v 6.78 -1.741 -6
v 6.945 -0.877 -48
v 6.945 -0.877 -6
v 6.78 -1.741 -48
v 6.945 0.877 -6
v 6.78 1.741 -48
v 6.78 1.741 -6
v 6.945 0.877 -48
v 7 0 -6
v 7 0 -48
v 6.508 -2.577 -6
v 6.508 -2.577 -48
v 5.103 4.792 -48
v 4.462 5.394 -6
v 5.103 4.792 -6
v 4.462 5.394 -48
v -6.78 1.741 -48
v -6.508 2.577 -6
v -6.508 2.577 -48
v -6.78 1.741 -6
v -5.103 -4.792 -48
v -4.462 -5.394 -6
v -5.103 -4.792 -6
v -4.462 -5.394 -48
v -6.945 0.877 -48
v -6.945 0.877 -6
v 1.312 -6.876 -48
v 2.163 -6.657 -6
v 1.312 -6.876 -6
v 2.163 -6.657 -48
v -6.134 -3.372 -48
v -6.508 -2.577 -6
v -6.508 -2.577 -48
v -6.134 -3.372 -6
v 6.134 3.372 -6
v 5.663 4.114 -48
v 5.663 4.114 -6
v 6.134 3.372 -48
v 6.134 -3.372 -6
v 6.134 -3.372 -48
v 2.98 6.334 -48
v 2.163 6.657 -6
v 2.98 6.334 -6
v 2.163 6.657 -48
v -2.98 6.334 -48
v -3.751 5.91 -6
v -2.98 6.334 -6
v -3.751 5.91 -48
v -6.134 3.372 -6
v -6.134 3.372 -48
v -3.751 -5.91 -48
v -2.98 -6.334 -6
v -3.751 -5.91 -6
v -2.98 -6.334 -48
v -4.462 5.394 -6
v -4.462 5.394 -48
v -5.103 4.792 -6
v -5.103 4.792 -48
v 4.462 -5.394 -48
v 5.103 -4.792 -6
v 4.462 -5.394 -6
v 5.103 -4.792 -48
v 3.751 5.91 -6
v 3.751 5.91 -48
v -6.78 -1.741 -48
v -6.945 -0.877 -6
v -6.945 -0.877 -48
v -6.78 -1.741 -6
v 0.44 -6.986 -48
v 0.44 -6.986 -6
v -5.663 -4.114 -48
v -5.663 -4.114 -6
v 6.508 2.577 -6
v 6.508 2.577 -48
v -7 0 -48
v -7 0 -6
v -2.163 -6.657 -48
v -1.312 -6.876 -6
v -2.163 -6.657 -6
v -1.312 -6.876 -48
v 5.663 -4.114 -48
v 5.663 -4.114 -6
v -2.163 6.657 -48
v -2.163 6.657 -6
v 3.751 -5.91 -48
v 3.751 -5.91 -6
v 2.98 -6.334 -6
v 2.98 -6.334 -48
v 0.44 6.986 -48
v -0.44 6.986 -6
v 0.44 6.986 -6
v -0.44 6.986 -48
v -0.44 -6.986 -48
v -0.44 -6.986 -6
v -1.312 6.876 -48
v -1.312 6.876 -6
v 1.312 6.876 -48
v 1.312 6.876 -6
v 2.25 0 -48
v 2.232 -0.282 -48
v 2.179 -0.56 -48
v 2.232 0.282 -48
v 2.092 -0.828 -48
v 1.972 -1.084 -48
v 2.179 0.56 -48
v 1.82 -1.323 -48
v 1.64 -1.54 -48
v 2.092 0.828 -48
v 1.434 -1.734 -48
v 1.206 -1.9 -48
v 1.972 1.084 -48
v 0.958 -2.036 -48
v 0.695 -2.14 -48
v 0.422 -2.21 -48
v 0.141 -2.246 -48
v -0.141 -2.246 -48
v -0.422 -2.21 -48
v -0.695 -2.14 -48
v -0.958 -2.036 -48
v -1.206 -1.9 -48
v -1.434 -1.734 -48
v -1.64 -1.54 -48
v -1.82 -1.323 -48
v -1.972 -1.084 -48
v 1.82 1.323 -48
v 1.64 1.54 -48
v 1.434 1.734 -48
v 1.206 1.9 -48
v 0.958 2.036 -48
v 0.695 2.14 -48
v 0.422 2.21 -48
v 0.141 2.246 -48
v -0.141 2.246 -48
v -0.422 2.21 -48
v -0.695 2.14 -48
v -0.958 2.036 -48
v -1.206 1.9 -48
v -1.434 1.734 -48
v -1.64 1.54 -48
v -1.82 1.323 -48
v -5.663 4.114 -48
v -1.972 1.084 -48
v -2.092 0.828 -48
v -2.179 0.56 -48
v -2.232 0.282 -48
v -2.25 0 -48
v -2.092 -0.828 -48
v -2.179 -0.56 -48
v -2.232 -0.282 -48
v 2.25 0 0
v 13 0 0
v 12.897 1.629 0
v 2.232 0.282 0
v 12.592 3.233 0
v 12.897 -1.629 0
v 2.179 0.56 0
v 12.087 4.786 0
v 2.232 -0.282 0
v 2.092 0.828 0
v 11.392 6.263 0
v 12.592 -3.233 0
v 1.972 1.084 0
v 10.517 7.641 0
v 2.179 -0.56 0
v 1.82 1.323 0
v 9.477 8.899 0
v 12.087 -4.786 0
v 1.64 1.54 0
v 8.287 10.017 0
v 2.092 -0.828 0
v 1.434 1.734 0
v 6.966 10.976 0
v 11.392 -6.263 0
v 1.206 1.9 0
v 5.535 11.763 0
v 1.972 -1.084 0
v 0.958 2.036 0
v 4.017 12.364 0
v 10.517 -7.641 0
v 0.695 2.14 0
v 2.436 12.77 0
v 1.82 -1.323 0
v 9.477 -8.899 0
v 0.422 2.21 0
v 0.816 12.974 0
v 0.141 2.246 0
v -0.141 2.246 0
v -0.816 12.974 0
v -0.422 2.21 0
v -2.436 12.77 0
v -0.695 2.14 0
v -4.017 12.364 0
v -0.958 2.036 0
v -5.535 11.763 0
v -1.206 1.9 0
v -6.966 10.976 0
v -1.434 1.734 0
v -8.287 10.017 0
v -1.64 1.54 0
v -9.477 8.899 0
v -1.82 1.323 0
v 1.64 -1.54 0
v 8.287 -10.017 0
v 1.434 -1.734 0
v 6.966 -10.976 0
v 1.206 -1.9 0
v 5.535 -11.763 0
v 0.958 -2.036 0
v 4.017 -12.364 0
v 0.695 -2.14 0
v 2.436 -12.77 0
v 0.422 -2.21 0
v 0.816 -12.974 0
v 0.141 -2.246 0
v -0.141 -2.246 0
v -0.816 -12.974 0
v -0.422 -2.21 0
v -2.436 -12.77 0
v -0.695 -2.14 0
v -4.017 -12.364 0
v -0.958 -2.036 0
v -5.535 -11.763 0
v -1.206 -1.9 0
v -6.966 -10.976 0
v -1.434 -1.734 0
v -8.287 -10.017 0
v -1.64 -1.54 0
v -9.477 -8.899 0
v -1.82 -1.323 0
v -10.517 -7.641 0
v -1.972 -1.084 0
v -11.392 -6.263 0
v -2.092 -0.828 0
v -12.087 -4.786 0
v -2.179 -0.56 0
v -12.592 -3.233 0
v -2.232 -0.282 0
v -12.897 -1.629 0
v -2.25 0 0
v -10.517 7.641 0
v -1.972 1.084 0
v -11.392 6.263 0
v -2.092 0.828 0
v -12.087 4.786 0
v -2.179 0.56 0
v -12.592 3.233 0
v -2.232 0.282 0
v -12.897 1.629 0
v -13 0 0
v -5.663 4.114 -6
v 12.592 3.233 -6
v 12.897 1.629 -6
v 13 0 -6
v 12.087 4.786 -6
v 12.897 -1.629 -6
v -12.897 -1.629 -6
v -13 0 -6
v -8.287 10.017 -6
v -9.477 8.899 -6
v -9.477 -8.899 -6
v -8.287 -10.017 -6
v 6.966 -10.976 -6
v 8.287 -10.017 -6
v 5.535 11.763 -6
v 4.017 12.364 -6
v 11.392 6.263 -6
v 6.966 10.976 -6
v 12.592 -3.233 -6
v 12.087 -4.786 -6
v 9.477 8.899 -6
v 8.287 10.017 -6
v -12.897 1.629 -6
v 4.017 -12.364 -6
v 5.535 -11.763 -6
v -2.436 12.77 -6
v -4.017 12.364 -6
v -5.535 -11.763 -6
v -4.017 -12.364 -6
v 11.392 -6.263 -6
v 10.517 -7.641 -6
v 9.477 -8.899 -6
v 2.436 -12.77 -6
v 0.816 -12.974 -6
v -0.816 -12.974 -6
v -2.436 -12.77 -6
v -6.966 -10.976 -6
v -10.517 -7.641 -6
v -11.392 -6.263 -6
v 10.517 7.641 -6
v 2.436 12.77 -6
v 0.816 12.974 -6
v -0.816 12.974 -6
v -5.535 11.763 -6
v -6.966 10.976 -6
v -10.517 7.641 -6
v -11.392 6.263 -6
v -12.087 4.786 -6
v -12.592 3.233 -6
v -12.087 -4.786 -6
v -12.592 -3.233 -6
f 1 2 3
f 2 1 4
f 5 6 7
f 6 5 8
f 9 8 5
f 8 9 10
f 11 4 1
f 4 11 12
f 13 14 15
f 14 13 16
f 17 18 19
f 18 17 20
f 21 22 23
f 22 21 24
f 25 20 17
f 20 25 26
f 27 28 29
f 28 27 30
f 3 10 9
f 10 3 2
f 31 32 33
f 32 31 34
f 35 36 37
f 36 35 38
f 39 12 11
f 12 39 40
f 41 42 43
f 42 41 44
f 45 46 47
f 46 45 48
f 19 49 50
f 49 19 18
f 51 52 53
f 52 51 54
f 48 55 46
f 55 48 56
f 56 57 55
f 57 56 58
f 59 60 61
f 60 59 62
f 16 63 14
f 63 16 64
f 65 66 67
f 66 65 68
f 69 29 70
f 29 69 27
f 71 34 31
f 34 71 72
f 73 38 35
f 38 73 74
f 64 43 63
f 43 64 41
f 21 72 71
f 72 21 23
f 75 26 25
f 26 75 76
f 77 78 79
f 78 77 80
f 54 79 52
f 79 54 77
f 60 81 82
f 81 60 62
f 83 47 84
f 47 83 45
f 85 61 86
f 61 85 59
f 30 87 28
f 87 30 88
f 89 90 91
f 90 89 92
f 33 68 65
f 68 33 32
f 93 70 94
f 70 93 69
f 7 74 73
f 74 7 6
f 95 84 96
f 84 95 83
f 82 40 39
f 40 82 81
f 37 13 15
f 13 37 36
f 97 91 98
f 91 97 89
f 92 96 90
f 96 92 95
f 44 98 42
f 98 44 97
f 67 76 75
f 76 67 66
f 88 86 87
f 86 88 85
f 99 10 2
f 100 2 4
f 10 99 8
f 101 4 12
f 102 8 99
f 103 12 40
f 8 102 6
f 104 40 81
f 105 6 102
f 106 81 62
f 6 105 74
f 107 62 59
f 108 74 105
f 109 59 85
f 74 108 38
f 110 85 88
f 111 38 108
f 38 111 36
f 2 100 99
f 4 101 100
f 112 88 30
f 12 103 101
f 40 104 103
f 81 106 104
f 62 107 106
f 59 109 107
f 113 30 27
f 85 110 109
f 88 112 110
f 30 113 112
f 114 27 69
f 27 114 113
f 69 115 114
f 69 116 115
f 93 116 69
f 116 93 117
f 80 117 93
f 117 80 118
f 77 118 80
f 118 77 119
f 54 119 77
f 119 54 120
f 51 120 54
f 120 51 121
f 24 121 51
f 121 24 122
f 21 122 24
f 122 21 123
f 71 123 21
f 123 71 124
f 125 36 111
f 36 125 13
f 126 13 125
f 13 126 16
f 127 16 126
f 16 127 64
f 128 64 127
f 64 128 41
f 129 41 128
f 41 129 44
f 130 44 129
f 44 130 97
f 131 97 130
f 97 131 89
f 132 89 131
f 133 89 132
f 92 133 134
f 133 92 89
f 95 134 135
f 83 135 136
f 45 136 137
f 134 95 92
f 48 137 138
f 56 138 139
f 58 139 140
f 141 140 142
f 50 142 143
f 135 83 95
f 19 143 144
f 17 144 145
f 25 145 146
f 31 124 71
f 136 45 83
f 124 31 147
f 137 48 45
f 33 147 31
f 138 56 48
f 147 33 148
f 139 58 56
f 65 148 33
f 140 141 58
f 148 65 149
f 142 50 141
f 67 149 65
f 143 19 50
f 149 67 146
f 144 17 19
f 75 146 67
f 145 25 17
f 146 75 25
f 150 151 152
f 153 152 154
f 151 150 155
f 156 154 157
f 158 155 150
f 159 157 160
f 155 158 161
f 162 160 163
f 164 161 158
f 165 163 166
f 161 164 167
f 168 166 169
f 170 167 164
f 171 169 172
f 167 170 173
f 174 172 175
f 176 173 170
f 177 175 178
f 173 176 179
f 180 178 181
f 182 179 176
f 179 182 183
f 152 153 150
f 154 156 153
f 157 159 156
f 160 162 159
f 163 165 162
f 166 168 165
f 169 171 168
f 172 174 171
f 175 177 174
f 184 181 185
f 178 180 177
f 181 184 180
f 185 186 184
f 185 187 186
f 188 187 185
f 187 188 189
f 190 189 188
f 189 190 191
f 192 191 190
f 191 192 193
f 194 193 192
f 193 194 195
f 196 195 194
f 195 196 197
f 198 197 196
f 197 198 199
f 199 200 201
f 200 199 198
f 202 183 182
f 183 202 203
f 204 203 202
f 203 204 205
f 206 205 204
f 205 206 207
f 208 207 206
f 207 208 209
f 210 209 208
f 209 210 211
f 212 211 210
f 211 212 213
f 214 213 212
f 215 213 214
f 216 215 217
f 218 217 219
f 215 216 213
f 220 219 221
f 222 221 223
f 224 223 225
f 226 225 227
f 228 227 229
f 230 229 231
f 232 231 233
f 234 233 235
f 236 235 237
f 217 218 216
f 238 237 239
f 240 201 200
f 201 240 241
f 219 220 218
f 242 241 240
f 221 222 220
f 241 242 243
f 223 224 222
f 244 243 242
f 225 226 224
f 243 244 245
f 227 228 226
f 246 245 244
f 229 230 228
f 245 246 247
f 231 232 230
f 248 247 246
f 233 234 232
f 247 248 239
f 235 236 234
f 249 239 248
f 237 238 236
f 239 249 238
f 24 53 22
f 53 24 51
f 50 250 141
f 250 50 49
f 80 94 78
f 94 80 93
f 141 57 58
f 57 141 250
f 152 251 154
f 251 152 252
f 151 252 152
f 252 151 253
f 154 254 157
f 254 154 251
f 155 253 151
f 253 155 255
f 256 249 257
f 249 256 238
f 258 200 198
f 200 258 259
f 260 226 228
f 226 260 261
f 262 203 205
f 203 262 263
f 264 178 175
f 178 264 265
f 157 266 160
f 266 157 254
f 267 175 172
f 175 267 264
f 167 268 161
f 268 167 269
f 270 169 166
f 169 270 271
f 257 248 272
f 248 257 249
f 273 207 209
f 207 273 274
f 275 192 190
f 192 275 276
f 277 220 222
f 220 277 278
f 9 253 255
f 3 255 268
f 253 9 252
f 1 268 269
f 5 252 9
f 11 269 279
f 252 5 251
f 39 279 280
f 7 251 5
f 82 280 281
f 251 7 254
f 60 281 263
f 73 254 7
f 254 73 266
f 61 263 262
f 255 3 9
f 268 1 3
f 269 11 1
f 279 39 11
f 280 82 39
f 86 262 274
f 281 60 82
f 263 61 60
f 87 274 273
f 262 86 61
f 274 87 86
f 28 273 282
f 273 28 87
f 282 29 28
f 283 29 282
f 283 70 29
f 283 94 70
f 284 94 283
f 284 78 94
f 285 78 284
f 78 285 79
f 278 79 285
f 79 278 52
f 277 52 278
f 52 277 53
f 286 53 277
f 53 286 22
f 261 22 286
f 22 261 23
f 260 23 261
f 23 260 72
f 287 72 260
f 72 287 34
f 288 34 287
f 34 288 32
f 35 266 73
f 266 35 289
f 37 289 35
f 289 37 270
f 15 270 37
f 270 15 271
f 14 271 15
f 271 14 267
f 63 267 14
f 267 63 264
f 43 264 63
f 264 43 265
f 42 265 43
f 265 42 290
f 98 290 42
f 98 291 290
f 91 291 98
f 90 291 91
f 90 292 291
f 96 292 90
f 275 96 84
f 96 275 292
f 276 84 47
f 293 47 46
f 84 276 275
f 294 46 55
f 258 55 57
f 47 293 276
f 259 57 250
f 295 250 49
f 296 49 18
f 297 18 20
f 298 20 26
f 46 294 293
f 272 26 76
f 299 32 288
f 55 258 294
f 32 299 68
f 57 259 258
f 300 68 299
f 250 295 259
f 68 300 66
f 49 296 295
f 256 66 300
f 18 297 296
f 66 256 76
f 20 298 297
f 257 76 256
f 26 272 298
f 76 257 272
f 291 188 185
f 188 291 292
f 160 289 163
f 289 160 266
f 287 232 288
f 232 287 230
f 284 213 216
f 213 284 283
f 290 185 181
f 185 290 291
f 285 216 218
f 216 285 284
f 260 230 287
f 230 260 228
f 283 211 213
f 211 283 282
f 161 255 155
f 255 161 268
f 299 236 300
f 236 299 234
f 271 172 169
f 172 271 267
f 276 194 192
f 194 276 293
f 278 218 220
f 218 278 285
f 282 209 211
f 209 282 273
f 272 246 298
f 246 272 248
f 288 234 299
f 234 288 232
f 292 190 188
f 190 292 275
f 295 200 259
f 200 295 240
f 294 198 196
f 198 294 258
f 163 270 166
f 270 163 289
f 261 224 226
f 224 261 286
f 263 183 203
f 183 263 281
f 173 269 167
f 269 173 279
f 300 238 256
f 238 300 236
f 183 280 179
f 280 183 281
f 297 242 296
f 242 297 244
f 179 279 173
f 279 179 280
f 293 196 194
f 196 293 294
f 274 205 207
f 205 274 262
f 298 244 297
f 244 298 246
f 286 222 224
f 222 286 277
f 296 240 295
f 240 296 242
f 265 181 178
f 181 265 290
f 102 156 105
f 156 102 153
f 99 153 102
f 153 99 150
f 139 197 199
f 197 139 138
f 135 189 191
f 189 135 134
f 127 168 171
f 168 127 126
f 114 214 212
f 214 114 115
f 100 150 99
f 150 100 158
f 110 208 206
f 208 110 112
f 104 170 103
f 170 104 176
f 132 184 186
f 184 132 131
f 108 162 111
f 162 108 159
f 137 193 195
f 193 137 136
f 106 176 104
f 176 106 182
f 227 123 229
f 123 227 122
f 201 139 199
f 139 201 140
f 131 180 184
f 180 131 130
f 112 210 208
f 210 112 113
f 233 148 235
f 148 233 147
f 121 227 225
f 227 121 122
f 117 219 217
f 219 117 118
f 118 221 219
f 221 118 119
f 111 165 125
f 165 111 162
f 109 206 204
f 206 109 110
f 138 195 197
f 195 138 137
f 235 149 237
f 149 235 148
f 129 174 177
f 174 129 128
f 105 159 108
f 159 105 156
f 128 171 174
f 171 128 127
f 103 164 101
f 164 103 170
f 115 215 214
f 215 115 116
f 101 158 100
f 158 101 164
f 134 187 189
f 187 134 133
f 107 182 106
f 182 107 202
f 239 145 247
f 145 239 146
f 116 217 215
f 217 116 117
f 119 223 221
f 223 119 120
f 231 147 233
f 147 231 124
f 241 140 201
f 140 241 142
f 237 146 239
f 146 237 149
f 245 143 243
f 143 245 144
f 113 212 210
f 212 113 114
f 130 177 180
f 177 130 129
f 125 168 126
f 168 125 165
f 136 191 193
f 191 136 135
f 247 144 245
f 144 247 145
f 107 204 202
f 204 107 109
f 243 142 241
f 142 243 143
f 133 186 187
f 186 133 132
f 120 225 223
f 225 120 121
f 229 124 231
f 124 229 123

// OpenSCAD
$fn = 50;


difference() {
	union() {
		translate(v = [0, 0, -48.0000000000]) {
			cylinder(h = 48, r = 7.0000000000);
		}
		translate(v = [0, 0, -6.0000000000]) {
			cylinder(h = 6, r = 13.0000000000);
		}
	}
	union() {
		#translate(v = [0, 0, -48]) {
			cylinder(h = 48, r = 2.2500000000);
		}
	}
}
